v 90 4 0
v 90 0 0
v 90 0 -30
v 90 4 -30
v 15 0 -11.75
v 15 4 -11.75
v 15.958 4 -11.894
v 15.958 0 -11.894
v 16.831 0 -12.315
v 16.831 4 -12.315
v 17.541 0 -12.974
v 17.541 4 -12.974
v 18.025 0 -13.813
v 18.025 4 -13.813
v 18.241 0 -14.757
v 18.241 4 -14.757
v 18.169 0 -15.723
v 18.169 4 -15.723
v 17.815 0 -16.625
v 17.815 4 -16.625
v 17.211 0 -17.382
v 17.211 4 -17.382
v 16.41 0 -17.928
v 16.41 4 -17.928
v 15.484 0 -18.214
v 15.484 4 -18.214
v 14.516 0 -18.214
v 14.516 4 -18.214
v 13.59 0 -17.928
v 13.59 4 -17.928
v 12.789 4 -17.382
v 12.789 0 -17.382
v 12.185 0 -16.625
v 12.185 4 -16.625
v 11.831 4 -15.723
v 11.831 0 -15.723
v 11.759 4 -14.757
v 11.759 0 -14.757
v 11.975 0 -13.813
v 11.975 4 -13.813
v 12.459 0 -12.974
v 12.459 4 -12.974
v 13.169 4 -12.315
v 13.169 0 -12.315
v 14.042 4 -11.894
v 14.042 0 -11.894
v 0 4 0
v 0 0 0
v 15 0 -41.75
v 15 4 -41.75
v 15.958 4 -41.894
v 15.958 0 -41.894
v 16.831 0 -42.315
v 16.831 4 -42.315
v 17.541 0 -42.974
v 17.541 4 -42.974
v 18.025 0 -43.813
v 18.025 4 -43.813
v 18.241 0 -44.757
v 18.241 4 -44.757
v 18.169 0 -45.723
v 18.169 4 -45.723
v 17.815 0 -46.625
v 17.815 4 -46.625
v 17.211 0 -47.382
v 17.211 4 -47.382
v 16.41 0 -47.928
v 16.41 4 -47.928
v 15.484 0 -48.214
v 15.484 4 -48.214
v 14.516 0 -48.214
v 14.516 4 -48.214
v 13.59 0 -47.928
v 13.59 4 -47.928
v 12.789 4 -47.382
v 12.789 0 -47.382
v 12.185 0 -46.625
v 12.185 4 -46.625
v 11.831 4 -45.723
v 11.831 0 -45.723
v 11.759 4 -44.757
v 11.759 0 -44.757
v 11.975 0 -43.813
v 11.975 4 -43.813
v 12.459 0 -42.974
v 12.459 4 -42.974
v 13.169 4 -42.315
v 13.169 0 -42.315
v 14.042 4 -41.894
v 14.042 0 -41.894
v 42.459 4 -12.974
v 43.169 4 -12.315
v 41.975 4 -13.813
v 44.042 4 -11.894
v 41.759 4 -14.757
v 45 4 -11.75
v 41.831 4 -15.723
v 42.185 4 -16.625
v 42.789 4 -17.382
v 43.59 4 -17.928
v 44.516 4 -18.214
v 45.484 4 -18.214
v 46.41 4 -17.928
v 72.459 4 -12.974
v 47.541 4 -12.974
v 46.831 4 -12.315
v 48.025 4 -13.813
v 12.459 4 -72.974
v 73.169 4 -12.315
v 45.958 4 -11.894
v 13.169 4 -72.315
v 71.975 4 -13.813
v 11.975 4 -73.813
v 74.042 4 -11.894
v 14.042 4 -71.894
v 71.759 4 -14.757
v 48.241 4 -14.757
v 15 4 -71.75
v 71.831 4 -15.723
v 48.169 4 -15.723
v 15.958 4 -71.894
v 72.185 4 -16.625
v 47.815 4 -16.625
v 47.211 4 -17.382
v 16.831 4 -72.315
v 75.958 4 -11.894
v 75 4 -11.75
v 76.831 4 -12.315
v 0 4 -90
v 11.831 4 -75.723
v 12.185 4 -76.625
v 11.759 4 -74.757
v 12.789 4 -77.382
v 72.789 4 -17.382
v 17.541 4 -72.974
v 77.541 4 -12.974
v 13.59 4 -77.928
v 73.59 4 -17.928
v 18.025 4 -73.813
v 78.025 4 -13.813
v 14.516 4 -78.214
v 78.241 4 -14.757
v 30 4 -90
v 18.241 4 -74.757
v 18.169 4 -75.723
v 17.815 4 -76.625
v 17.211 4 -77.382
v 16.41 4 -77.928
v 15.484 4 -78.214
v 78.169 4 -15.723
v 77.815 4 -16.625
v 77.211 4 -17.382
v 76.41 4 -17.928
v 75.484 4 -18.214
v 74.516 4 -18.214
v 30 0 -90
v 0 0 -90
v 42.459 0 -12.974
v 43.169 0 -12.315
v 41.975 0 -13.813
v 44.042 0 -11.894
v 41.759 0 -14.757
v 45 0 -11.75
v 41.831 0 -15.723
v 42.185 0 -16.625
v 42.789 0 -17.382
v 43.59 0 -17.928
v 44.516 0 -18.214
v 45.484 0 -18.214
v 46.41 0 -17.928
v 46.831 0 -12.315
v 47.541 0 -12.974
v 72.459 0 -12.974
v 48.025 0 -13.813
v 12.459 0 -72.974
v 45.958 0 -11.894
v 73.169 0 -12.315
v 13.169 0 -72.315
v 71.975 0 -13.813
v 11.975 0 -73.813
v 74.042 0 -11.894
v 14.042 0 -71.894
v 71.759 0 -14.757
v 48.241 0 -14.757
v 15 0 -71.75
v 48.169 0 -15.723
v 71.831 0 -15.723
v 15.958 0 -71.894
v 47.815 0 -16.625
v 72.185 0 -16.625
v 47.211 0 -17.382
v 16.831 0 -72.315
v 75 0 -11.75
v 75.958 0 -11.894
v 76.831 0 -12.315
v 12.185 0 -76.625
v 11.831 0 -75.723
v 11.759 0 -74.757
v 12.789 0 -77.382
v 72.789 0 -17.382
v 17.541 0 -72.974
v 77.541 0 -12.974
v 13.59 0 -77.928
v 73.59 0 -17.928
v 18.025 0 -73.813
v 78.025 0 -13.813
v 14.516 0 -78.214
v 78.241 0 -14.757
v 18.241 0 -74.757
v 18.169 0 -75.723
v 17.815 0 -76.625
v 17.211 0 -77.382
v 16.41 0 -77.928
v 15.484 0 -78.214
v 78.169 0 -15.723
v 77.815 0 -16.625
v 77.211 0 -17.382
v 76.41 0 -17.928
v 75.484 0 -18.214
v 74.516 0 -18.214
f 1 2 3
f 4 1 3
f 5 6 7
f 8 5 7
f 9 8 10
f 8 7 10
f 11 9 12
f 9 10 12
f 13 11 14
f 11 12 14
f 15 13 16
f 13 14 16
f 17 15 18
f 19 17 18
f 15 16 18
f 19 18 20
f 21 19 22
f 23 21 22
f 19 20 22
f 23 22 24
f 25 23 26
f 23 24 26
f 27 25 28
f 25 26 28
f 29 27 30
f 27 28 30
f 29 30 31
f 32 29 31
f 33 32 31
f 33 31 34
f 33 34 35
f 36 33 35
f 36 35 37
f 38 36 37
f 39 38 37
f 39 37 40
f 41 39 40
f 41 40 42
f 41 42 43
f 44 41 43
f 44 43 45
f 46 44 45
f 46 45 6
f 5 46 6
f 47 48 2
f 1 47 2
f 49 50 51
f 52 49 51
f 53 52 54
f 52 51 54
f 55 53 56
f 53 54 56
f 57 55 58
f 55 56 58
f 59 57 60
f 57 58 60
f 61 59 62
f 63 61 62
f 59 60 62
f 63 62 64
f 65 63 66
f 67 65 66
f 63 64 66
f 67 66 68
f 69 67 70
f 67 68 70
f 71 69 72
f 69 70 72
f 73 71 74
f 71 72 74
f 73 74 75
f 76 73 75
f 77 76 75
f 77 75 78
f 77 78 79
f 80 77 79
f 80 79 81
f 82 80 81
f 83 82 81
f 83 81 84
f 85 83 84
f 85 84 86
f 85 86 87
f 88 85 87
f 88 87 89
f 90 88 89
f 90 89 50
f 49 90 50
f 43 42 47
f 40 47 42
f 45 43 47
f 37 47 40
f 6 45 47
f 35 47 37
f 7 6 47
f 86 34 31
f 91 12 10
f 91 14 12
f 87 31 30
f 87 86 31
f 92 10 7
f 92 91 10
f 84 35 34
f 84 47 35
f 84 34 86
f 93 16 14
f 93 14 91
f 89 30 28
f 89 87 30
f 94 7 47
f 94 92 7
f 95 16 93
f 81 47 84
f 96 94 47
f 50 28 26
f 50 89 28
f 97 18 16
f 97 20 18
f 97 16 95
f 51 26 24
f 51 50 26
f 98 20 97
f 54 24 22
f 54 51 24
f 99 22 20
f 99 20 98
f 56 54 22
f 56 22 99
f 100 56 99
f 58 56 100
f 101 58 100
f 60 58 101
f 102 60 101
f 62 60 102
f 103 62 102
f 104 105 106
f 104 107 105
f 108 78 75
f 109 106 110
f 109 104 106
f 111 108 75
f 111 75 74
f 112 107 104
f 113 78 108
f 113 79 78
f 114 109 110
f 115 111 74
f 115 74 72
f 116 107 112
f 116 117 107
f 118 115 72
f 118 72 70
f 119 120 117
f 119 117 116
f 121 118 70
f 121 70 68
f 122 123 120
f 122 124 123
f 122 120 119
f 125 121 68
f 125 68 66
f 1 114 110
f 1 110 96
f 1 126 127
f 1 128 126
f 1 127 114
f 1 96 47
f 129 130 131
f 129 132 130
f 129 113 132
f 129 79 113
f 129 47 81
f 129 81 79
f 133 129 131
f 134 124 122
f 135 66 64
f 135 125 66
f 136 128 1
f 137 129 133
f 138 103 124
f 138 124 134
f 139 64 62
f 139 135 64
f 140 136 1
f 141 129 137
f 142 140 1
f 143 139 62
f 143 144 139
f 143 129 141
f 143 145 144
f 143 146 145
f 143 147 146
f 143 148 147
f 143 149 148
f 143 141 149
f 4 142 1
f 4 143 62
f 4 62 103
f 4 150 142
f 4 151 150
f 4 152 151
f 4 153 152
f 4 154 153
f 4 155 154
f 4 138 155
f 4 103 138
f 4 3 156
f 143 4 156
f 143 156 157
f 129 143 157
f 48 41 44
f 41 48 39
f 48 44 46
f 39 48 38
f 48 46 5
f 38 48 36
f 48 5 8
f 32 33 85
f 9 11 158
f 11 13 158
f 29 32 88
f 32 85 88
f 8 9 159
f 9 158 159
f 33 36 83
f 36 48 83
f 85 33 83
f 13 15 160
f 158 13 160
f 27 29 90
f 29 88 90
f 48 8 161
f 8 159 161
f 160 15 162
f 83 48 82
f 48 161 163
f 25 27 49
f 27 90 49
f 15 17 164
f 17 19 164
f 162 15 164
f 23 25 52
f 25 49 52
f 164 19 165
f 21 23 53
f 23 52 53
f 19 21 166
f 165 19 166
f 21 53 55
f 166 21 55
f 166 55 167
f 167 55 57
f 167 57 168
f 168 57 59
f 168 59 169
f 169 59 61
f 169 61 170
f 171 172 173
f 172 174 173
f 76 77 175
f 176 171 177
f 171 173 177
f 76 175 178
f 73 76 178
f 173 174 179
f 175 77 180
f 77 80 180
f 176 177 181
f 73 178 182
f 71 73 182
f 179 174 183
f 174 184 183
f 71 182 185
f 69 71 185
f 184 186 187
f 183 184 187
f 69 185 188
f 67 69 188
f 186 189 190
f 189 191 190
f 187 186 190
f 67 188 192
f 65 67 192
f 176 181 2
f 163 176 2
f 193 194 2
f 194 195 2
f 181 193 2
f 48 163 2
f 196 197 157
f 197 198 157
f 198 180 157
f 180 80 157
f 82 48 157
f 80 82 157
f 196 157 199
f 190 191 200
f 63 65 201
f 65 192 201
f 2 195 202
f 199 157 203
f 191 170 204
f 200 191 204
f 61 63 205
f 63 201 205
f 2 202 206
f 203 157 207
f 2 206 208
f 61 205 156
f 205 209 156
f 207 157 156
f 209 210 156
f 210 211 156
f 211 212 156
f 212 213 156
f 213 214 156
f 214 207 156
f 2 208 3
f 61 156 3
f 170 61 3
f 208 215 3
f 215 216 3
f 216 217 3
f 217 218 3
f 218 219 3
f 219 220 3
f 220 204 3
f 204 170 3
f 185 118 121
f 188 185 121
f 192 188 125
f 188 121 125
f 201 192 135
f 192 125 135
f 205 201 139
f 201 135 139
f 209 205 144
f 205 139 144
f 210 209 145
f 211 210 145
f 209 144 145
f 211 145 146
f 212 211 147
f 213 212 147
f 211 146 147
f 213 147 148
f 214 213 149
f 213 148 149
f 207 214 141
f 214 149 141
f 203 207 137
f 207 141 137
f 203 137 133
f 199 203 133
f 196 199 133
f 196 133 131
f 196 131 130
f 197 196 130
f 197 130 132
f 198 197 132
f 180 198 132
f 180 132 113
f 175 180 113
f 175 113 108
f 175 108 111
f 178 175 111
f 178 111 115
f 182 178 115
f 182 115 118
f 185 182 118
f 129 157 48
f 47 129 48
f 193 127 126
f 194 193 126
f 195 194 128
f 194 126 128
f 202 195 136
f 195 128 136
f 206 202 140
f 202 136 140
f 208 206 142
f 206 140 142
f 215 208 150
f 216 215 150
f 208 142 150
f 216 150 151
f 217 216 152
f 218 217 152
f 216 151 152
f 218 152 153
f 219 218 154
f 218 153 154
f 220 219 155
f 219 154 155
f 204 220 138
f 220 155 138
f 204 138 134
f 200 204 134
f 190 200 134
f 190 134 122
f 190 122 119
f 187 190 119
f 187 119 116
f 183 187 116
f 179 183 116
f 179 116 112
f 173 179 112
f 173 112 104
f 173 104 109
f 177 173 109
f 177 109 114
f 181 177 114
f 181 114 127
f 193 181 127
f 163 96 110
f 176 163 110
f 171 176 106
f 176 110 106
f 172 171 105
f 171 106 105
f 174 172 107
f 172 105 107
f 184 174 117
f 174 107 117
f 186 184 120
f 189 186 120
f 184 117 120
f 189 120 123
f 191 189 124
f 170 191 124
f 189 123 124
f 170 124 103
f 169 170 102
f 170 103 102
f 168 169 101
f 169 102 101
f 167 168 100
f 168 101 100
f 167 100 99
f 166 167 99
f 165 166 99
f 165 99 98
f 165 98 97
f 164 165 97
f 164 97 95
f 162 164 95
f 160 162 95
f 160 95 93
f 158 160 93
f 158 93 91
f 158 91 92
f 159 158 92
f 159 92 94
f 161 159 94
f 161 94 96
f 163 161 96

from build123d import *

# Parameters (mm, degrees)
BOSS_EXTRUDE1_DEPTH = 4
SKETCH2_R           = 3.25
CUT_EXTRUDE1_DEPTH  = 128.342059038


with BuildPart() as part:
    # Sketch1 → Boss-Extrude1 (new body)
    with BuildSketch(Plane(origin=(0, 0, 0), x_dir=(1, 0, 0), z_dir=(0, 1, 0))):
        Polygon((0, 0), (90, 0), (90, 30), (30, 90), (0, 90), align=None)
    extrude(amount=BOSS_EXTRUDE1_DEPTH)

    # Sketch2 → Cut-Extrude1 (cut, through all)
    with BuildSketch(Plane(origin=(0, 4, 0), x_dir=(1, 0, 0), z_dir=(0, 1, 0))):
        with Locations(Location((15, 15, 0), (0, 0, 270))):
            Circle(SKETCH2_R)
        with Locations(Location((45, 15, 0), (0, 0, 270))):
            Circle(SKETCH2_R)
        with Locations(Location((75, 15, 0), (0, 0, 270))):
            Circle(SKETCH2_R)
        with Locations(Location((15, 45, 0), (0, 0, 270))):
            Circle(SKETCH2_R)
        with Locations(Location((15, 75, 0), (0, 0, 270))):
            Circle(SKETCH2_R)
    extrude(amount=-CUT_EXTRUDE1_DEPTH, mode=Mode.SUBTRACT)


solid = part.part
